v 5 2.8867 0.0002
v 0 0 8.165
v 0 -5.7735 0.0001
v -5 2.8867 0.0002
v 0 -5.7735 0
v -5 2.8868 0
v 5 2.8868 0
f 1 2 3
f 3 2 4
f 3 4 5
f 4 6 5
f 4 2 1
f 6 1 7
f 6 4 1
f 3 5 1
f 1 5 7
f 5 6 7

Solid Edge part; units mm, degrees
sketch "Sketch1" plane through (0, 0, 0) normal (0, 0, 1) x (1, 0, 0)
  line L0 (0, -5.7735) -> (5, 2.8868)
  line L1 (5, 2.8868) -> (-5, 2.8868)
  line L2 (-5, 2.8868) -> (0, -5.7735)
extrude "Protrusion1" add sketch "Sketch1" along normal up to vertex (8.165 mm away)
sketch "Sketch2" plane through (0, 0, 0) normal (1, 0, 0) x (0, 1, 0)
  line L0 (2.8868, 8.165) -> (0, 8.165)
  line L1 (0, 8.165) -> (2.8868, 0)
  line L2 (2.8868, 0) -> (2.8868, 8.165)
extrude "Cutout1" cut sketch "Sketch2" along normal mid plane 10
pattern_circular "Pattern1" count 3 over 360 about axis through (0, 0, 0) along (0, 0, 1) of "Cutout1"
